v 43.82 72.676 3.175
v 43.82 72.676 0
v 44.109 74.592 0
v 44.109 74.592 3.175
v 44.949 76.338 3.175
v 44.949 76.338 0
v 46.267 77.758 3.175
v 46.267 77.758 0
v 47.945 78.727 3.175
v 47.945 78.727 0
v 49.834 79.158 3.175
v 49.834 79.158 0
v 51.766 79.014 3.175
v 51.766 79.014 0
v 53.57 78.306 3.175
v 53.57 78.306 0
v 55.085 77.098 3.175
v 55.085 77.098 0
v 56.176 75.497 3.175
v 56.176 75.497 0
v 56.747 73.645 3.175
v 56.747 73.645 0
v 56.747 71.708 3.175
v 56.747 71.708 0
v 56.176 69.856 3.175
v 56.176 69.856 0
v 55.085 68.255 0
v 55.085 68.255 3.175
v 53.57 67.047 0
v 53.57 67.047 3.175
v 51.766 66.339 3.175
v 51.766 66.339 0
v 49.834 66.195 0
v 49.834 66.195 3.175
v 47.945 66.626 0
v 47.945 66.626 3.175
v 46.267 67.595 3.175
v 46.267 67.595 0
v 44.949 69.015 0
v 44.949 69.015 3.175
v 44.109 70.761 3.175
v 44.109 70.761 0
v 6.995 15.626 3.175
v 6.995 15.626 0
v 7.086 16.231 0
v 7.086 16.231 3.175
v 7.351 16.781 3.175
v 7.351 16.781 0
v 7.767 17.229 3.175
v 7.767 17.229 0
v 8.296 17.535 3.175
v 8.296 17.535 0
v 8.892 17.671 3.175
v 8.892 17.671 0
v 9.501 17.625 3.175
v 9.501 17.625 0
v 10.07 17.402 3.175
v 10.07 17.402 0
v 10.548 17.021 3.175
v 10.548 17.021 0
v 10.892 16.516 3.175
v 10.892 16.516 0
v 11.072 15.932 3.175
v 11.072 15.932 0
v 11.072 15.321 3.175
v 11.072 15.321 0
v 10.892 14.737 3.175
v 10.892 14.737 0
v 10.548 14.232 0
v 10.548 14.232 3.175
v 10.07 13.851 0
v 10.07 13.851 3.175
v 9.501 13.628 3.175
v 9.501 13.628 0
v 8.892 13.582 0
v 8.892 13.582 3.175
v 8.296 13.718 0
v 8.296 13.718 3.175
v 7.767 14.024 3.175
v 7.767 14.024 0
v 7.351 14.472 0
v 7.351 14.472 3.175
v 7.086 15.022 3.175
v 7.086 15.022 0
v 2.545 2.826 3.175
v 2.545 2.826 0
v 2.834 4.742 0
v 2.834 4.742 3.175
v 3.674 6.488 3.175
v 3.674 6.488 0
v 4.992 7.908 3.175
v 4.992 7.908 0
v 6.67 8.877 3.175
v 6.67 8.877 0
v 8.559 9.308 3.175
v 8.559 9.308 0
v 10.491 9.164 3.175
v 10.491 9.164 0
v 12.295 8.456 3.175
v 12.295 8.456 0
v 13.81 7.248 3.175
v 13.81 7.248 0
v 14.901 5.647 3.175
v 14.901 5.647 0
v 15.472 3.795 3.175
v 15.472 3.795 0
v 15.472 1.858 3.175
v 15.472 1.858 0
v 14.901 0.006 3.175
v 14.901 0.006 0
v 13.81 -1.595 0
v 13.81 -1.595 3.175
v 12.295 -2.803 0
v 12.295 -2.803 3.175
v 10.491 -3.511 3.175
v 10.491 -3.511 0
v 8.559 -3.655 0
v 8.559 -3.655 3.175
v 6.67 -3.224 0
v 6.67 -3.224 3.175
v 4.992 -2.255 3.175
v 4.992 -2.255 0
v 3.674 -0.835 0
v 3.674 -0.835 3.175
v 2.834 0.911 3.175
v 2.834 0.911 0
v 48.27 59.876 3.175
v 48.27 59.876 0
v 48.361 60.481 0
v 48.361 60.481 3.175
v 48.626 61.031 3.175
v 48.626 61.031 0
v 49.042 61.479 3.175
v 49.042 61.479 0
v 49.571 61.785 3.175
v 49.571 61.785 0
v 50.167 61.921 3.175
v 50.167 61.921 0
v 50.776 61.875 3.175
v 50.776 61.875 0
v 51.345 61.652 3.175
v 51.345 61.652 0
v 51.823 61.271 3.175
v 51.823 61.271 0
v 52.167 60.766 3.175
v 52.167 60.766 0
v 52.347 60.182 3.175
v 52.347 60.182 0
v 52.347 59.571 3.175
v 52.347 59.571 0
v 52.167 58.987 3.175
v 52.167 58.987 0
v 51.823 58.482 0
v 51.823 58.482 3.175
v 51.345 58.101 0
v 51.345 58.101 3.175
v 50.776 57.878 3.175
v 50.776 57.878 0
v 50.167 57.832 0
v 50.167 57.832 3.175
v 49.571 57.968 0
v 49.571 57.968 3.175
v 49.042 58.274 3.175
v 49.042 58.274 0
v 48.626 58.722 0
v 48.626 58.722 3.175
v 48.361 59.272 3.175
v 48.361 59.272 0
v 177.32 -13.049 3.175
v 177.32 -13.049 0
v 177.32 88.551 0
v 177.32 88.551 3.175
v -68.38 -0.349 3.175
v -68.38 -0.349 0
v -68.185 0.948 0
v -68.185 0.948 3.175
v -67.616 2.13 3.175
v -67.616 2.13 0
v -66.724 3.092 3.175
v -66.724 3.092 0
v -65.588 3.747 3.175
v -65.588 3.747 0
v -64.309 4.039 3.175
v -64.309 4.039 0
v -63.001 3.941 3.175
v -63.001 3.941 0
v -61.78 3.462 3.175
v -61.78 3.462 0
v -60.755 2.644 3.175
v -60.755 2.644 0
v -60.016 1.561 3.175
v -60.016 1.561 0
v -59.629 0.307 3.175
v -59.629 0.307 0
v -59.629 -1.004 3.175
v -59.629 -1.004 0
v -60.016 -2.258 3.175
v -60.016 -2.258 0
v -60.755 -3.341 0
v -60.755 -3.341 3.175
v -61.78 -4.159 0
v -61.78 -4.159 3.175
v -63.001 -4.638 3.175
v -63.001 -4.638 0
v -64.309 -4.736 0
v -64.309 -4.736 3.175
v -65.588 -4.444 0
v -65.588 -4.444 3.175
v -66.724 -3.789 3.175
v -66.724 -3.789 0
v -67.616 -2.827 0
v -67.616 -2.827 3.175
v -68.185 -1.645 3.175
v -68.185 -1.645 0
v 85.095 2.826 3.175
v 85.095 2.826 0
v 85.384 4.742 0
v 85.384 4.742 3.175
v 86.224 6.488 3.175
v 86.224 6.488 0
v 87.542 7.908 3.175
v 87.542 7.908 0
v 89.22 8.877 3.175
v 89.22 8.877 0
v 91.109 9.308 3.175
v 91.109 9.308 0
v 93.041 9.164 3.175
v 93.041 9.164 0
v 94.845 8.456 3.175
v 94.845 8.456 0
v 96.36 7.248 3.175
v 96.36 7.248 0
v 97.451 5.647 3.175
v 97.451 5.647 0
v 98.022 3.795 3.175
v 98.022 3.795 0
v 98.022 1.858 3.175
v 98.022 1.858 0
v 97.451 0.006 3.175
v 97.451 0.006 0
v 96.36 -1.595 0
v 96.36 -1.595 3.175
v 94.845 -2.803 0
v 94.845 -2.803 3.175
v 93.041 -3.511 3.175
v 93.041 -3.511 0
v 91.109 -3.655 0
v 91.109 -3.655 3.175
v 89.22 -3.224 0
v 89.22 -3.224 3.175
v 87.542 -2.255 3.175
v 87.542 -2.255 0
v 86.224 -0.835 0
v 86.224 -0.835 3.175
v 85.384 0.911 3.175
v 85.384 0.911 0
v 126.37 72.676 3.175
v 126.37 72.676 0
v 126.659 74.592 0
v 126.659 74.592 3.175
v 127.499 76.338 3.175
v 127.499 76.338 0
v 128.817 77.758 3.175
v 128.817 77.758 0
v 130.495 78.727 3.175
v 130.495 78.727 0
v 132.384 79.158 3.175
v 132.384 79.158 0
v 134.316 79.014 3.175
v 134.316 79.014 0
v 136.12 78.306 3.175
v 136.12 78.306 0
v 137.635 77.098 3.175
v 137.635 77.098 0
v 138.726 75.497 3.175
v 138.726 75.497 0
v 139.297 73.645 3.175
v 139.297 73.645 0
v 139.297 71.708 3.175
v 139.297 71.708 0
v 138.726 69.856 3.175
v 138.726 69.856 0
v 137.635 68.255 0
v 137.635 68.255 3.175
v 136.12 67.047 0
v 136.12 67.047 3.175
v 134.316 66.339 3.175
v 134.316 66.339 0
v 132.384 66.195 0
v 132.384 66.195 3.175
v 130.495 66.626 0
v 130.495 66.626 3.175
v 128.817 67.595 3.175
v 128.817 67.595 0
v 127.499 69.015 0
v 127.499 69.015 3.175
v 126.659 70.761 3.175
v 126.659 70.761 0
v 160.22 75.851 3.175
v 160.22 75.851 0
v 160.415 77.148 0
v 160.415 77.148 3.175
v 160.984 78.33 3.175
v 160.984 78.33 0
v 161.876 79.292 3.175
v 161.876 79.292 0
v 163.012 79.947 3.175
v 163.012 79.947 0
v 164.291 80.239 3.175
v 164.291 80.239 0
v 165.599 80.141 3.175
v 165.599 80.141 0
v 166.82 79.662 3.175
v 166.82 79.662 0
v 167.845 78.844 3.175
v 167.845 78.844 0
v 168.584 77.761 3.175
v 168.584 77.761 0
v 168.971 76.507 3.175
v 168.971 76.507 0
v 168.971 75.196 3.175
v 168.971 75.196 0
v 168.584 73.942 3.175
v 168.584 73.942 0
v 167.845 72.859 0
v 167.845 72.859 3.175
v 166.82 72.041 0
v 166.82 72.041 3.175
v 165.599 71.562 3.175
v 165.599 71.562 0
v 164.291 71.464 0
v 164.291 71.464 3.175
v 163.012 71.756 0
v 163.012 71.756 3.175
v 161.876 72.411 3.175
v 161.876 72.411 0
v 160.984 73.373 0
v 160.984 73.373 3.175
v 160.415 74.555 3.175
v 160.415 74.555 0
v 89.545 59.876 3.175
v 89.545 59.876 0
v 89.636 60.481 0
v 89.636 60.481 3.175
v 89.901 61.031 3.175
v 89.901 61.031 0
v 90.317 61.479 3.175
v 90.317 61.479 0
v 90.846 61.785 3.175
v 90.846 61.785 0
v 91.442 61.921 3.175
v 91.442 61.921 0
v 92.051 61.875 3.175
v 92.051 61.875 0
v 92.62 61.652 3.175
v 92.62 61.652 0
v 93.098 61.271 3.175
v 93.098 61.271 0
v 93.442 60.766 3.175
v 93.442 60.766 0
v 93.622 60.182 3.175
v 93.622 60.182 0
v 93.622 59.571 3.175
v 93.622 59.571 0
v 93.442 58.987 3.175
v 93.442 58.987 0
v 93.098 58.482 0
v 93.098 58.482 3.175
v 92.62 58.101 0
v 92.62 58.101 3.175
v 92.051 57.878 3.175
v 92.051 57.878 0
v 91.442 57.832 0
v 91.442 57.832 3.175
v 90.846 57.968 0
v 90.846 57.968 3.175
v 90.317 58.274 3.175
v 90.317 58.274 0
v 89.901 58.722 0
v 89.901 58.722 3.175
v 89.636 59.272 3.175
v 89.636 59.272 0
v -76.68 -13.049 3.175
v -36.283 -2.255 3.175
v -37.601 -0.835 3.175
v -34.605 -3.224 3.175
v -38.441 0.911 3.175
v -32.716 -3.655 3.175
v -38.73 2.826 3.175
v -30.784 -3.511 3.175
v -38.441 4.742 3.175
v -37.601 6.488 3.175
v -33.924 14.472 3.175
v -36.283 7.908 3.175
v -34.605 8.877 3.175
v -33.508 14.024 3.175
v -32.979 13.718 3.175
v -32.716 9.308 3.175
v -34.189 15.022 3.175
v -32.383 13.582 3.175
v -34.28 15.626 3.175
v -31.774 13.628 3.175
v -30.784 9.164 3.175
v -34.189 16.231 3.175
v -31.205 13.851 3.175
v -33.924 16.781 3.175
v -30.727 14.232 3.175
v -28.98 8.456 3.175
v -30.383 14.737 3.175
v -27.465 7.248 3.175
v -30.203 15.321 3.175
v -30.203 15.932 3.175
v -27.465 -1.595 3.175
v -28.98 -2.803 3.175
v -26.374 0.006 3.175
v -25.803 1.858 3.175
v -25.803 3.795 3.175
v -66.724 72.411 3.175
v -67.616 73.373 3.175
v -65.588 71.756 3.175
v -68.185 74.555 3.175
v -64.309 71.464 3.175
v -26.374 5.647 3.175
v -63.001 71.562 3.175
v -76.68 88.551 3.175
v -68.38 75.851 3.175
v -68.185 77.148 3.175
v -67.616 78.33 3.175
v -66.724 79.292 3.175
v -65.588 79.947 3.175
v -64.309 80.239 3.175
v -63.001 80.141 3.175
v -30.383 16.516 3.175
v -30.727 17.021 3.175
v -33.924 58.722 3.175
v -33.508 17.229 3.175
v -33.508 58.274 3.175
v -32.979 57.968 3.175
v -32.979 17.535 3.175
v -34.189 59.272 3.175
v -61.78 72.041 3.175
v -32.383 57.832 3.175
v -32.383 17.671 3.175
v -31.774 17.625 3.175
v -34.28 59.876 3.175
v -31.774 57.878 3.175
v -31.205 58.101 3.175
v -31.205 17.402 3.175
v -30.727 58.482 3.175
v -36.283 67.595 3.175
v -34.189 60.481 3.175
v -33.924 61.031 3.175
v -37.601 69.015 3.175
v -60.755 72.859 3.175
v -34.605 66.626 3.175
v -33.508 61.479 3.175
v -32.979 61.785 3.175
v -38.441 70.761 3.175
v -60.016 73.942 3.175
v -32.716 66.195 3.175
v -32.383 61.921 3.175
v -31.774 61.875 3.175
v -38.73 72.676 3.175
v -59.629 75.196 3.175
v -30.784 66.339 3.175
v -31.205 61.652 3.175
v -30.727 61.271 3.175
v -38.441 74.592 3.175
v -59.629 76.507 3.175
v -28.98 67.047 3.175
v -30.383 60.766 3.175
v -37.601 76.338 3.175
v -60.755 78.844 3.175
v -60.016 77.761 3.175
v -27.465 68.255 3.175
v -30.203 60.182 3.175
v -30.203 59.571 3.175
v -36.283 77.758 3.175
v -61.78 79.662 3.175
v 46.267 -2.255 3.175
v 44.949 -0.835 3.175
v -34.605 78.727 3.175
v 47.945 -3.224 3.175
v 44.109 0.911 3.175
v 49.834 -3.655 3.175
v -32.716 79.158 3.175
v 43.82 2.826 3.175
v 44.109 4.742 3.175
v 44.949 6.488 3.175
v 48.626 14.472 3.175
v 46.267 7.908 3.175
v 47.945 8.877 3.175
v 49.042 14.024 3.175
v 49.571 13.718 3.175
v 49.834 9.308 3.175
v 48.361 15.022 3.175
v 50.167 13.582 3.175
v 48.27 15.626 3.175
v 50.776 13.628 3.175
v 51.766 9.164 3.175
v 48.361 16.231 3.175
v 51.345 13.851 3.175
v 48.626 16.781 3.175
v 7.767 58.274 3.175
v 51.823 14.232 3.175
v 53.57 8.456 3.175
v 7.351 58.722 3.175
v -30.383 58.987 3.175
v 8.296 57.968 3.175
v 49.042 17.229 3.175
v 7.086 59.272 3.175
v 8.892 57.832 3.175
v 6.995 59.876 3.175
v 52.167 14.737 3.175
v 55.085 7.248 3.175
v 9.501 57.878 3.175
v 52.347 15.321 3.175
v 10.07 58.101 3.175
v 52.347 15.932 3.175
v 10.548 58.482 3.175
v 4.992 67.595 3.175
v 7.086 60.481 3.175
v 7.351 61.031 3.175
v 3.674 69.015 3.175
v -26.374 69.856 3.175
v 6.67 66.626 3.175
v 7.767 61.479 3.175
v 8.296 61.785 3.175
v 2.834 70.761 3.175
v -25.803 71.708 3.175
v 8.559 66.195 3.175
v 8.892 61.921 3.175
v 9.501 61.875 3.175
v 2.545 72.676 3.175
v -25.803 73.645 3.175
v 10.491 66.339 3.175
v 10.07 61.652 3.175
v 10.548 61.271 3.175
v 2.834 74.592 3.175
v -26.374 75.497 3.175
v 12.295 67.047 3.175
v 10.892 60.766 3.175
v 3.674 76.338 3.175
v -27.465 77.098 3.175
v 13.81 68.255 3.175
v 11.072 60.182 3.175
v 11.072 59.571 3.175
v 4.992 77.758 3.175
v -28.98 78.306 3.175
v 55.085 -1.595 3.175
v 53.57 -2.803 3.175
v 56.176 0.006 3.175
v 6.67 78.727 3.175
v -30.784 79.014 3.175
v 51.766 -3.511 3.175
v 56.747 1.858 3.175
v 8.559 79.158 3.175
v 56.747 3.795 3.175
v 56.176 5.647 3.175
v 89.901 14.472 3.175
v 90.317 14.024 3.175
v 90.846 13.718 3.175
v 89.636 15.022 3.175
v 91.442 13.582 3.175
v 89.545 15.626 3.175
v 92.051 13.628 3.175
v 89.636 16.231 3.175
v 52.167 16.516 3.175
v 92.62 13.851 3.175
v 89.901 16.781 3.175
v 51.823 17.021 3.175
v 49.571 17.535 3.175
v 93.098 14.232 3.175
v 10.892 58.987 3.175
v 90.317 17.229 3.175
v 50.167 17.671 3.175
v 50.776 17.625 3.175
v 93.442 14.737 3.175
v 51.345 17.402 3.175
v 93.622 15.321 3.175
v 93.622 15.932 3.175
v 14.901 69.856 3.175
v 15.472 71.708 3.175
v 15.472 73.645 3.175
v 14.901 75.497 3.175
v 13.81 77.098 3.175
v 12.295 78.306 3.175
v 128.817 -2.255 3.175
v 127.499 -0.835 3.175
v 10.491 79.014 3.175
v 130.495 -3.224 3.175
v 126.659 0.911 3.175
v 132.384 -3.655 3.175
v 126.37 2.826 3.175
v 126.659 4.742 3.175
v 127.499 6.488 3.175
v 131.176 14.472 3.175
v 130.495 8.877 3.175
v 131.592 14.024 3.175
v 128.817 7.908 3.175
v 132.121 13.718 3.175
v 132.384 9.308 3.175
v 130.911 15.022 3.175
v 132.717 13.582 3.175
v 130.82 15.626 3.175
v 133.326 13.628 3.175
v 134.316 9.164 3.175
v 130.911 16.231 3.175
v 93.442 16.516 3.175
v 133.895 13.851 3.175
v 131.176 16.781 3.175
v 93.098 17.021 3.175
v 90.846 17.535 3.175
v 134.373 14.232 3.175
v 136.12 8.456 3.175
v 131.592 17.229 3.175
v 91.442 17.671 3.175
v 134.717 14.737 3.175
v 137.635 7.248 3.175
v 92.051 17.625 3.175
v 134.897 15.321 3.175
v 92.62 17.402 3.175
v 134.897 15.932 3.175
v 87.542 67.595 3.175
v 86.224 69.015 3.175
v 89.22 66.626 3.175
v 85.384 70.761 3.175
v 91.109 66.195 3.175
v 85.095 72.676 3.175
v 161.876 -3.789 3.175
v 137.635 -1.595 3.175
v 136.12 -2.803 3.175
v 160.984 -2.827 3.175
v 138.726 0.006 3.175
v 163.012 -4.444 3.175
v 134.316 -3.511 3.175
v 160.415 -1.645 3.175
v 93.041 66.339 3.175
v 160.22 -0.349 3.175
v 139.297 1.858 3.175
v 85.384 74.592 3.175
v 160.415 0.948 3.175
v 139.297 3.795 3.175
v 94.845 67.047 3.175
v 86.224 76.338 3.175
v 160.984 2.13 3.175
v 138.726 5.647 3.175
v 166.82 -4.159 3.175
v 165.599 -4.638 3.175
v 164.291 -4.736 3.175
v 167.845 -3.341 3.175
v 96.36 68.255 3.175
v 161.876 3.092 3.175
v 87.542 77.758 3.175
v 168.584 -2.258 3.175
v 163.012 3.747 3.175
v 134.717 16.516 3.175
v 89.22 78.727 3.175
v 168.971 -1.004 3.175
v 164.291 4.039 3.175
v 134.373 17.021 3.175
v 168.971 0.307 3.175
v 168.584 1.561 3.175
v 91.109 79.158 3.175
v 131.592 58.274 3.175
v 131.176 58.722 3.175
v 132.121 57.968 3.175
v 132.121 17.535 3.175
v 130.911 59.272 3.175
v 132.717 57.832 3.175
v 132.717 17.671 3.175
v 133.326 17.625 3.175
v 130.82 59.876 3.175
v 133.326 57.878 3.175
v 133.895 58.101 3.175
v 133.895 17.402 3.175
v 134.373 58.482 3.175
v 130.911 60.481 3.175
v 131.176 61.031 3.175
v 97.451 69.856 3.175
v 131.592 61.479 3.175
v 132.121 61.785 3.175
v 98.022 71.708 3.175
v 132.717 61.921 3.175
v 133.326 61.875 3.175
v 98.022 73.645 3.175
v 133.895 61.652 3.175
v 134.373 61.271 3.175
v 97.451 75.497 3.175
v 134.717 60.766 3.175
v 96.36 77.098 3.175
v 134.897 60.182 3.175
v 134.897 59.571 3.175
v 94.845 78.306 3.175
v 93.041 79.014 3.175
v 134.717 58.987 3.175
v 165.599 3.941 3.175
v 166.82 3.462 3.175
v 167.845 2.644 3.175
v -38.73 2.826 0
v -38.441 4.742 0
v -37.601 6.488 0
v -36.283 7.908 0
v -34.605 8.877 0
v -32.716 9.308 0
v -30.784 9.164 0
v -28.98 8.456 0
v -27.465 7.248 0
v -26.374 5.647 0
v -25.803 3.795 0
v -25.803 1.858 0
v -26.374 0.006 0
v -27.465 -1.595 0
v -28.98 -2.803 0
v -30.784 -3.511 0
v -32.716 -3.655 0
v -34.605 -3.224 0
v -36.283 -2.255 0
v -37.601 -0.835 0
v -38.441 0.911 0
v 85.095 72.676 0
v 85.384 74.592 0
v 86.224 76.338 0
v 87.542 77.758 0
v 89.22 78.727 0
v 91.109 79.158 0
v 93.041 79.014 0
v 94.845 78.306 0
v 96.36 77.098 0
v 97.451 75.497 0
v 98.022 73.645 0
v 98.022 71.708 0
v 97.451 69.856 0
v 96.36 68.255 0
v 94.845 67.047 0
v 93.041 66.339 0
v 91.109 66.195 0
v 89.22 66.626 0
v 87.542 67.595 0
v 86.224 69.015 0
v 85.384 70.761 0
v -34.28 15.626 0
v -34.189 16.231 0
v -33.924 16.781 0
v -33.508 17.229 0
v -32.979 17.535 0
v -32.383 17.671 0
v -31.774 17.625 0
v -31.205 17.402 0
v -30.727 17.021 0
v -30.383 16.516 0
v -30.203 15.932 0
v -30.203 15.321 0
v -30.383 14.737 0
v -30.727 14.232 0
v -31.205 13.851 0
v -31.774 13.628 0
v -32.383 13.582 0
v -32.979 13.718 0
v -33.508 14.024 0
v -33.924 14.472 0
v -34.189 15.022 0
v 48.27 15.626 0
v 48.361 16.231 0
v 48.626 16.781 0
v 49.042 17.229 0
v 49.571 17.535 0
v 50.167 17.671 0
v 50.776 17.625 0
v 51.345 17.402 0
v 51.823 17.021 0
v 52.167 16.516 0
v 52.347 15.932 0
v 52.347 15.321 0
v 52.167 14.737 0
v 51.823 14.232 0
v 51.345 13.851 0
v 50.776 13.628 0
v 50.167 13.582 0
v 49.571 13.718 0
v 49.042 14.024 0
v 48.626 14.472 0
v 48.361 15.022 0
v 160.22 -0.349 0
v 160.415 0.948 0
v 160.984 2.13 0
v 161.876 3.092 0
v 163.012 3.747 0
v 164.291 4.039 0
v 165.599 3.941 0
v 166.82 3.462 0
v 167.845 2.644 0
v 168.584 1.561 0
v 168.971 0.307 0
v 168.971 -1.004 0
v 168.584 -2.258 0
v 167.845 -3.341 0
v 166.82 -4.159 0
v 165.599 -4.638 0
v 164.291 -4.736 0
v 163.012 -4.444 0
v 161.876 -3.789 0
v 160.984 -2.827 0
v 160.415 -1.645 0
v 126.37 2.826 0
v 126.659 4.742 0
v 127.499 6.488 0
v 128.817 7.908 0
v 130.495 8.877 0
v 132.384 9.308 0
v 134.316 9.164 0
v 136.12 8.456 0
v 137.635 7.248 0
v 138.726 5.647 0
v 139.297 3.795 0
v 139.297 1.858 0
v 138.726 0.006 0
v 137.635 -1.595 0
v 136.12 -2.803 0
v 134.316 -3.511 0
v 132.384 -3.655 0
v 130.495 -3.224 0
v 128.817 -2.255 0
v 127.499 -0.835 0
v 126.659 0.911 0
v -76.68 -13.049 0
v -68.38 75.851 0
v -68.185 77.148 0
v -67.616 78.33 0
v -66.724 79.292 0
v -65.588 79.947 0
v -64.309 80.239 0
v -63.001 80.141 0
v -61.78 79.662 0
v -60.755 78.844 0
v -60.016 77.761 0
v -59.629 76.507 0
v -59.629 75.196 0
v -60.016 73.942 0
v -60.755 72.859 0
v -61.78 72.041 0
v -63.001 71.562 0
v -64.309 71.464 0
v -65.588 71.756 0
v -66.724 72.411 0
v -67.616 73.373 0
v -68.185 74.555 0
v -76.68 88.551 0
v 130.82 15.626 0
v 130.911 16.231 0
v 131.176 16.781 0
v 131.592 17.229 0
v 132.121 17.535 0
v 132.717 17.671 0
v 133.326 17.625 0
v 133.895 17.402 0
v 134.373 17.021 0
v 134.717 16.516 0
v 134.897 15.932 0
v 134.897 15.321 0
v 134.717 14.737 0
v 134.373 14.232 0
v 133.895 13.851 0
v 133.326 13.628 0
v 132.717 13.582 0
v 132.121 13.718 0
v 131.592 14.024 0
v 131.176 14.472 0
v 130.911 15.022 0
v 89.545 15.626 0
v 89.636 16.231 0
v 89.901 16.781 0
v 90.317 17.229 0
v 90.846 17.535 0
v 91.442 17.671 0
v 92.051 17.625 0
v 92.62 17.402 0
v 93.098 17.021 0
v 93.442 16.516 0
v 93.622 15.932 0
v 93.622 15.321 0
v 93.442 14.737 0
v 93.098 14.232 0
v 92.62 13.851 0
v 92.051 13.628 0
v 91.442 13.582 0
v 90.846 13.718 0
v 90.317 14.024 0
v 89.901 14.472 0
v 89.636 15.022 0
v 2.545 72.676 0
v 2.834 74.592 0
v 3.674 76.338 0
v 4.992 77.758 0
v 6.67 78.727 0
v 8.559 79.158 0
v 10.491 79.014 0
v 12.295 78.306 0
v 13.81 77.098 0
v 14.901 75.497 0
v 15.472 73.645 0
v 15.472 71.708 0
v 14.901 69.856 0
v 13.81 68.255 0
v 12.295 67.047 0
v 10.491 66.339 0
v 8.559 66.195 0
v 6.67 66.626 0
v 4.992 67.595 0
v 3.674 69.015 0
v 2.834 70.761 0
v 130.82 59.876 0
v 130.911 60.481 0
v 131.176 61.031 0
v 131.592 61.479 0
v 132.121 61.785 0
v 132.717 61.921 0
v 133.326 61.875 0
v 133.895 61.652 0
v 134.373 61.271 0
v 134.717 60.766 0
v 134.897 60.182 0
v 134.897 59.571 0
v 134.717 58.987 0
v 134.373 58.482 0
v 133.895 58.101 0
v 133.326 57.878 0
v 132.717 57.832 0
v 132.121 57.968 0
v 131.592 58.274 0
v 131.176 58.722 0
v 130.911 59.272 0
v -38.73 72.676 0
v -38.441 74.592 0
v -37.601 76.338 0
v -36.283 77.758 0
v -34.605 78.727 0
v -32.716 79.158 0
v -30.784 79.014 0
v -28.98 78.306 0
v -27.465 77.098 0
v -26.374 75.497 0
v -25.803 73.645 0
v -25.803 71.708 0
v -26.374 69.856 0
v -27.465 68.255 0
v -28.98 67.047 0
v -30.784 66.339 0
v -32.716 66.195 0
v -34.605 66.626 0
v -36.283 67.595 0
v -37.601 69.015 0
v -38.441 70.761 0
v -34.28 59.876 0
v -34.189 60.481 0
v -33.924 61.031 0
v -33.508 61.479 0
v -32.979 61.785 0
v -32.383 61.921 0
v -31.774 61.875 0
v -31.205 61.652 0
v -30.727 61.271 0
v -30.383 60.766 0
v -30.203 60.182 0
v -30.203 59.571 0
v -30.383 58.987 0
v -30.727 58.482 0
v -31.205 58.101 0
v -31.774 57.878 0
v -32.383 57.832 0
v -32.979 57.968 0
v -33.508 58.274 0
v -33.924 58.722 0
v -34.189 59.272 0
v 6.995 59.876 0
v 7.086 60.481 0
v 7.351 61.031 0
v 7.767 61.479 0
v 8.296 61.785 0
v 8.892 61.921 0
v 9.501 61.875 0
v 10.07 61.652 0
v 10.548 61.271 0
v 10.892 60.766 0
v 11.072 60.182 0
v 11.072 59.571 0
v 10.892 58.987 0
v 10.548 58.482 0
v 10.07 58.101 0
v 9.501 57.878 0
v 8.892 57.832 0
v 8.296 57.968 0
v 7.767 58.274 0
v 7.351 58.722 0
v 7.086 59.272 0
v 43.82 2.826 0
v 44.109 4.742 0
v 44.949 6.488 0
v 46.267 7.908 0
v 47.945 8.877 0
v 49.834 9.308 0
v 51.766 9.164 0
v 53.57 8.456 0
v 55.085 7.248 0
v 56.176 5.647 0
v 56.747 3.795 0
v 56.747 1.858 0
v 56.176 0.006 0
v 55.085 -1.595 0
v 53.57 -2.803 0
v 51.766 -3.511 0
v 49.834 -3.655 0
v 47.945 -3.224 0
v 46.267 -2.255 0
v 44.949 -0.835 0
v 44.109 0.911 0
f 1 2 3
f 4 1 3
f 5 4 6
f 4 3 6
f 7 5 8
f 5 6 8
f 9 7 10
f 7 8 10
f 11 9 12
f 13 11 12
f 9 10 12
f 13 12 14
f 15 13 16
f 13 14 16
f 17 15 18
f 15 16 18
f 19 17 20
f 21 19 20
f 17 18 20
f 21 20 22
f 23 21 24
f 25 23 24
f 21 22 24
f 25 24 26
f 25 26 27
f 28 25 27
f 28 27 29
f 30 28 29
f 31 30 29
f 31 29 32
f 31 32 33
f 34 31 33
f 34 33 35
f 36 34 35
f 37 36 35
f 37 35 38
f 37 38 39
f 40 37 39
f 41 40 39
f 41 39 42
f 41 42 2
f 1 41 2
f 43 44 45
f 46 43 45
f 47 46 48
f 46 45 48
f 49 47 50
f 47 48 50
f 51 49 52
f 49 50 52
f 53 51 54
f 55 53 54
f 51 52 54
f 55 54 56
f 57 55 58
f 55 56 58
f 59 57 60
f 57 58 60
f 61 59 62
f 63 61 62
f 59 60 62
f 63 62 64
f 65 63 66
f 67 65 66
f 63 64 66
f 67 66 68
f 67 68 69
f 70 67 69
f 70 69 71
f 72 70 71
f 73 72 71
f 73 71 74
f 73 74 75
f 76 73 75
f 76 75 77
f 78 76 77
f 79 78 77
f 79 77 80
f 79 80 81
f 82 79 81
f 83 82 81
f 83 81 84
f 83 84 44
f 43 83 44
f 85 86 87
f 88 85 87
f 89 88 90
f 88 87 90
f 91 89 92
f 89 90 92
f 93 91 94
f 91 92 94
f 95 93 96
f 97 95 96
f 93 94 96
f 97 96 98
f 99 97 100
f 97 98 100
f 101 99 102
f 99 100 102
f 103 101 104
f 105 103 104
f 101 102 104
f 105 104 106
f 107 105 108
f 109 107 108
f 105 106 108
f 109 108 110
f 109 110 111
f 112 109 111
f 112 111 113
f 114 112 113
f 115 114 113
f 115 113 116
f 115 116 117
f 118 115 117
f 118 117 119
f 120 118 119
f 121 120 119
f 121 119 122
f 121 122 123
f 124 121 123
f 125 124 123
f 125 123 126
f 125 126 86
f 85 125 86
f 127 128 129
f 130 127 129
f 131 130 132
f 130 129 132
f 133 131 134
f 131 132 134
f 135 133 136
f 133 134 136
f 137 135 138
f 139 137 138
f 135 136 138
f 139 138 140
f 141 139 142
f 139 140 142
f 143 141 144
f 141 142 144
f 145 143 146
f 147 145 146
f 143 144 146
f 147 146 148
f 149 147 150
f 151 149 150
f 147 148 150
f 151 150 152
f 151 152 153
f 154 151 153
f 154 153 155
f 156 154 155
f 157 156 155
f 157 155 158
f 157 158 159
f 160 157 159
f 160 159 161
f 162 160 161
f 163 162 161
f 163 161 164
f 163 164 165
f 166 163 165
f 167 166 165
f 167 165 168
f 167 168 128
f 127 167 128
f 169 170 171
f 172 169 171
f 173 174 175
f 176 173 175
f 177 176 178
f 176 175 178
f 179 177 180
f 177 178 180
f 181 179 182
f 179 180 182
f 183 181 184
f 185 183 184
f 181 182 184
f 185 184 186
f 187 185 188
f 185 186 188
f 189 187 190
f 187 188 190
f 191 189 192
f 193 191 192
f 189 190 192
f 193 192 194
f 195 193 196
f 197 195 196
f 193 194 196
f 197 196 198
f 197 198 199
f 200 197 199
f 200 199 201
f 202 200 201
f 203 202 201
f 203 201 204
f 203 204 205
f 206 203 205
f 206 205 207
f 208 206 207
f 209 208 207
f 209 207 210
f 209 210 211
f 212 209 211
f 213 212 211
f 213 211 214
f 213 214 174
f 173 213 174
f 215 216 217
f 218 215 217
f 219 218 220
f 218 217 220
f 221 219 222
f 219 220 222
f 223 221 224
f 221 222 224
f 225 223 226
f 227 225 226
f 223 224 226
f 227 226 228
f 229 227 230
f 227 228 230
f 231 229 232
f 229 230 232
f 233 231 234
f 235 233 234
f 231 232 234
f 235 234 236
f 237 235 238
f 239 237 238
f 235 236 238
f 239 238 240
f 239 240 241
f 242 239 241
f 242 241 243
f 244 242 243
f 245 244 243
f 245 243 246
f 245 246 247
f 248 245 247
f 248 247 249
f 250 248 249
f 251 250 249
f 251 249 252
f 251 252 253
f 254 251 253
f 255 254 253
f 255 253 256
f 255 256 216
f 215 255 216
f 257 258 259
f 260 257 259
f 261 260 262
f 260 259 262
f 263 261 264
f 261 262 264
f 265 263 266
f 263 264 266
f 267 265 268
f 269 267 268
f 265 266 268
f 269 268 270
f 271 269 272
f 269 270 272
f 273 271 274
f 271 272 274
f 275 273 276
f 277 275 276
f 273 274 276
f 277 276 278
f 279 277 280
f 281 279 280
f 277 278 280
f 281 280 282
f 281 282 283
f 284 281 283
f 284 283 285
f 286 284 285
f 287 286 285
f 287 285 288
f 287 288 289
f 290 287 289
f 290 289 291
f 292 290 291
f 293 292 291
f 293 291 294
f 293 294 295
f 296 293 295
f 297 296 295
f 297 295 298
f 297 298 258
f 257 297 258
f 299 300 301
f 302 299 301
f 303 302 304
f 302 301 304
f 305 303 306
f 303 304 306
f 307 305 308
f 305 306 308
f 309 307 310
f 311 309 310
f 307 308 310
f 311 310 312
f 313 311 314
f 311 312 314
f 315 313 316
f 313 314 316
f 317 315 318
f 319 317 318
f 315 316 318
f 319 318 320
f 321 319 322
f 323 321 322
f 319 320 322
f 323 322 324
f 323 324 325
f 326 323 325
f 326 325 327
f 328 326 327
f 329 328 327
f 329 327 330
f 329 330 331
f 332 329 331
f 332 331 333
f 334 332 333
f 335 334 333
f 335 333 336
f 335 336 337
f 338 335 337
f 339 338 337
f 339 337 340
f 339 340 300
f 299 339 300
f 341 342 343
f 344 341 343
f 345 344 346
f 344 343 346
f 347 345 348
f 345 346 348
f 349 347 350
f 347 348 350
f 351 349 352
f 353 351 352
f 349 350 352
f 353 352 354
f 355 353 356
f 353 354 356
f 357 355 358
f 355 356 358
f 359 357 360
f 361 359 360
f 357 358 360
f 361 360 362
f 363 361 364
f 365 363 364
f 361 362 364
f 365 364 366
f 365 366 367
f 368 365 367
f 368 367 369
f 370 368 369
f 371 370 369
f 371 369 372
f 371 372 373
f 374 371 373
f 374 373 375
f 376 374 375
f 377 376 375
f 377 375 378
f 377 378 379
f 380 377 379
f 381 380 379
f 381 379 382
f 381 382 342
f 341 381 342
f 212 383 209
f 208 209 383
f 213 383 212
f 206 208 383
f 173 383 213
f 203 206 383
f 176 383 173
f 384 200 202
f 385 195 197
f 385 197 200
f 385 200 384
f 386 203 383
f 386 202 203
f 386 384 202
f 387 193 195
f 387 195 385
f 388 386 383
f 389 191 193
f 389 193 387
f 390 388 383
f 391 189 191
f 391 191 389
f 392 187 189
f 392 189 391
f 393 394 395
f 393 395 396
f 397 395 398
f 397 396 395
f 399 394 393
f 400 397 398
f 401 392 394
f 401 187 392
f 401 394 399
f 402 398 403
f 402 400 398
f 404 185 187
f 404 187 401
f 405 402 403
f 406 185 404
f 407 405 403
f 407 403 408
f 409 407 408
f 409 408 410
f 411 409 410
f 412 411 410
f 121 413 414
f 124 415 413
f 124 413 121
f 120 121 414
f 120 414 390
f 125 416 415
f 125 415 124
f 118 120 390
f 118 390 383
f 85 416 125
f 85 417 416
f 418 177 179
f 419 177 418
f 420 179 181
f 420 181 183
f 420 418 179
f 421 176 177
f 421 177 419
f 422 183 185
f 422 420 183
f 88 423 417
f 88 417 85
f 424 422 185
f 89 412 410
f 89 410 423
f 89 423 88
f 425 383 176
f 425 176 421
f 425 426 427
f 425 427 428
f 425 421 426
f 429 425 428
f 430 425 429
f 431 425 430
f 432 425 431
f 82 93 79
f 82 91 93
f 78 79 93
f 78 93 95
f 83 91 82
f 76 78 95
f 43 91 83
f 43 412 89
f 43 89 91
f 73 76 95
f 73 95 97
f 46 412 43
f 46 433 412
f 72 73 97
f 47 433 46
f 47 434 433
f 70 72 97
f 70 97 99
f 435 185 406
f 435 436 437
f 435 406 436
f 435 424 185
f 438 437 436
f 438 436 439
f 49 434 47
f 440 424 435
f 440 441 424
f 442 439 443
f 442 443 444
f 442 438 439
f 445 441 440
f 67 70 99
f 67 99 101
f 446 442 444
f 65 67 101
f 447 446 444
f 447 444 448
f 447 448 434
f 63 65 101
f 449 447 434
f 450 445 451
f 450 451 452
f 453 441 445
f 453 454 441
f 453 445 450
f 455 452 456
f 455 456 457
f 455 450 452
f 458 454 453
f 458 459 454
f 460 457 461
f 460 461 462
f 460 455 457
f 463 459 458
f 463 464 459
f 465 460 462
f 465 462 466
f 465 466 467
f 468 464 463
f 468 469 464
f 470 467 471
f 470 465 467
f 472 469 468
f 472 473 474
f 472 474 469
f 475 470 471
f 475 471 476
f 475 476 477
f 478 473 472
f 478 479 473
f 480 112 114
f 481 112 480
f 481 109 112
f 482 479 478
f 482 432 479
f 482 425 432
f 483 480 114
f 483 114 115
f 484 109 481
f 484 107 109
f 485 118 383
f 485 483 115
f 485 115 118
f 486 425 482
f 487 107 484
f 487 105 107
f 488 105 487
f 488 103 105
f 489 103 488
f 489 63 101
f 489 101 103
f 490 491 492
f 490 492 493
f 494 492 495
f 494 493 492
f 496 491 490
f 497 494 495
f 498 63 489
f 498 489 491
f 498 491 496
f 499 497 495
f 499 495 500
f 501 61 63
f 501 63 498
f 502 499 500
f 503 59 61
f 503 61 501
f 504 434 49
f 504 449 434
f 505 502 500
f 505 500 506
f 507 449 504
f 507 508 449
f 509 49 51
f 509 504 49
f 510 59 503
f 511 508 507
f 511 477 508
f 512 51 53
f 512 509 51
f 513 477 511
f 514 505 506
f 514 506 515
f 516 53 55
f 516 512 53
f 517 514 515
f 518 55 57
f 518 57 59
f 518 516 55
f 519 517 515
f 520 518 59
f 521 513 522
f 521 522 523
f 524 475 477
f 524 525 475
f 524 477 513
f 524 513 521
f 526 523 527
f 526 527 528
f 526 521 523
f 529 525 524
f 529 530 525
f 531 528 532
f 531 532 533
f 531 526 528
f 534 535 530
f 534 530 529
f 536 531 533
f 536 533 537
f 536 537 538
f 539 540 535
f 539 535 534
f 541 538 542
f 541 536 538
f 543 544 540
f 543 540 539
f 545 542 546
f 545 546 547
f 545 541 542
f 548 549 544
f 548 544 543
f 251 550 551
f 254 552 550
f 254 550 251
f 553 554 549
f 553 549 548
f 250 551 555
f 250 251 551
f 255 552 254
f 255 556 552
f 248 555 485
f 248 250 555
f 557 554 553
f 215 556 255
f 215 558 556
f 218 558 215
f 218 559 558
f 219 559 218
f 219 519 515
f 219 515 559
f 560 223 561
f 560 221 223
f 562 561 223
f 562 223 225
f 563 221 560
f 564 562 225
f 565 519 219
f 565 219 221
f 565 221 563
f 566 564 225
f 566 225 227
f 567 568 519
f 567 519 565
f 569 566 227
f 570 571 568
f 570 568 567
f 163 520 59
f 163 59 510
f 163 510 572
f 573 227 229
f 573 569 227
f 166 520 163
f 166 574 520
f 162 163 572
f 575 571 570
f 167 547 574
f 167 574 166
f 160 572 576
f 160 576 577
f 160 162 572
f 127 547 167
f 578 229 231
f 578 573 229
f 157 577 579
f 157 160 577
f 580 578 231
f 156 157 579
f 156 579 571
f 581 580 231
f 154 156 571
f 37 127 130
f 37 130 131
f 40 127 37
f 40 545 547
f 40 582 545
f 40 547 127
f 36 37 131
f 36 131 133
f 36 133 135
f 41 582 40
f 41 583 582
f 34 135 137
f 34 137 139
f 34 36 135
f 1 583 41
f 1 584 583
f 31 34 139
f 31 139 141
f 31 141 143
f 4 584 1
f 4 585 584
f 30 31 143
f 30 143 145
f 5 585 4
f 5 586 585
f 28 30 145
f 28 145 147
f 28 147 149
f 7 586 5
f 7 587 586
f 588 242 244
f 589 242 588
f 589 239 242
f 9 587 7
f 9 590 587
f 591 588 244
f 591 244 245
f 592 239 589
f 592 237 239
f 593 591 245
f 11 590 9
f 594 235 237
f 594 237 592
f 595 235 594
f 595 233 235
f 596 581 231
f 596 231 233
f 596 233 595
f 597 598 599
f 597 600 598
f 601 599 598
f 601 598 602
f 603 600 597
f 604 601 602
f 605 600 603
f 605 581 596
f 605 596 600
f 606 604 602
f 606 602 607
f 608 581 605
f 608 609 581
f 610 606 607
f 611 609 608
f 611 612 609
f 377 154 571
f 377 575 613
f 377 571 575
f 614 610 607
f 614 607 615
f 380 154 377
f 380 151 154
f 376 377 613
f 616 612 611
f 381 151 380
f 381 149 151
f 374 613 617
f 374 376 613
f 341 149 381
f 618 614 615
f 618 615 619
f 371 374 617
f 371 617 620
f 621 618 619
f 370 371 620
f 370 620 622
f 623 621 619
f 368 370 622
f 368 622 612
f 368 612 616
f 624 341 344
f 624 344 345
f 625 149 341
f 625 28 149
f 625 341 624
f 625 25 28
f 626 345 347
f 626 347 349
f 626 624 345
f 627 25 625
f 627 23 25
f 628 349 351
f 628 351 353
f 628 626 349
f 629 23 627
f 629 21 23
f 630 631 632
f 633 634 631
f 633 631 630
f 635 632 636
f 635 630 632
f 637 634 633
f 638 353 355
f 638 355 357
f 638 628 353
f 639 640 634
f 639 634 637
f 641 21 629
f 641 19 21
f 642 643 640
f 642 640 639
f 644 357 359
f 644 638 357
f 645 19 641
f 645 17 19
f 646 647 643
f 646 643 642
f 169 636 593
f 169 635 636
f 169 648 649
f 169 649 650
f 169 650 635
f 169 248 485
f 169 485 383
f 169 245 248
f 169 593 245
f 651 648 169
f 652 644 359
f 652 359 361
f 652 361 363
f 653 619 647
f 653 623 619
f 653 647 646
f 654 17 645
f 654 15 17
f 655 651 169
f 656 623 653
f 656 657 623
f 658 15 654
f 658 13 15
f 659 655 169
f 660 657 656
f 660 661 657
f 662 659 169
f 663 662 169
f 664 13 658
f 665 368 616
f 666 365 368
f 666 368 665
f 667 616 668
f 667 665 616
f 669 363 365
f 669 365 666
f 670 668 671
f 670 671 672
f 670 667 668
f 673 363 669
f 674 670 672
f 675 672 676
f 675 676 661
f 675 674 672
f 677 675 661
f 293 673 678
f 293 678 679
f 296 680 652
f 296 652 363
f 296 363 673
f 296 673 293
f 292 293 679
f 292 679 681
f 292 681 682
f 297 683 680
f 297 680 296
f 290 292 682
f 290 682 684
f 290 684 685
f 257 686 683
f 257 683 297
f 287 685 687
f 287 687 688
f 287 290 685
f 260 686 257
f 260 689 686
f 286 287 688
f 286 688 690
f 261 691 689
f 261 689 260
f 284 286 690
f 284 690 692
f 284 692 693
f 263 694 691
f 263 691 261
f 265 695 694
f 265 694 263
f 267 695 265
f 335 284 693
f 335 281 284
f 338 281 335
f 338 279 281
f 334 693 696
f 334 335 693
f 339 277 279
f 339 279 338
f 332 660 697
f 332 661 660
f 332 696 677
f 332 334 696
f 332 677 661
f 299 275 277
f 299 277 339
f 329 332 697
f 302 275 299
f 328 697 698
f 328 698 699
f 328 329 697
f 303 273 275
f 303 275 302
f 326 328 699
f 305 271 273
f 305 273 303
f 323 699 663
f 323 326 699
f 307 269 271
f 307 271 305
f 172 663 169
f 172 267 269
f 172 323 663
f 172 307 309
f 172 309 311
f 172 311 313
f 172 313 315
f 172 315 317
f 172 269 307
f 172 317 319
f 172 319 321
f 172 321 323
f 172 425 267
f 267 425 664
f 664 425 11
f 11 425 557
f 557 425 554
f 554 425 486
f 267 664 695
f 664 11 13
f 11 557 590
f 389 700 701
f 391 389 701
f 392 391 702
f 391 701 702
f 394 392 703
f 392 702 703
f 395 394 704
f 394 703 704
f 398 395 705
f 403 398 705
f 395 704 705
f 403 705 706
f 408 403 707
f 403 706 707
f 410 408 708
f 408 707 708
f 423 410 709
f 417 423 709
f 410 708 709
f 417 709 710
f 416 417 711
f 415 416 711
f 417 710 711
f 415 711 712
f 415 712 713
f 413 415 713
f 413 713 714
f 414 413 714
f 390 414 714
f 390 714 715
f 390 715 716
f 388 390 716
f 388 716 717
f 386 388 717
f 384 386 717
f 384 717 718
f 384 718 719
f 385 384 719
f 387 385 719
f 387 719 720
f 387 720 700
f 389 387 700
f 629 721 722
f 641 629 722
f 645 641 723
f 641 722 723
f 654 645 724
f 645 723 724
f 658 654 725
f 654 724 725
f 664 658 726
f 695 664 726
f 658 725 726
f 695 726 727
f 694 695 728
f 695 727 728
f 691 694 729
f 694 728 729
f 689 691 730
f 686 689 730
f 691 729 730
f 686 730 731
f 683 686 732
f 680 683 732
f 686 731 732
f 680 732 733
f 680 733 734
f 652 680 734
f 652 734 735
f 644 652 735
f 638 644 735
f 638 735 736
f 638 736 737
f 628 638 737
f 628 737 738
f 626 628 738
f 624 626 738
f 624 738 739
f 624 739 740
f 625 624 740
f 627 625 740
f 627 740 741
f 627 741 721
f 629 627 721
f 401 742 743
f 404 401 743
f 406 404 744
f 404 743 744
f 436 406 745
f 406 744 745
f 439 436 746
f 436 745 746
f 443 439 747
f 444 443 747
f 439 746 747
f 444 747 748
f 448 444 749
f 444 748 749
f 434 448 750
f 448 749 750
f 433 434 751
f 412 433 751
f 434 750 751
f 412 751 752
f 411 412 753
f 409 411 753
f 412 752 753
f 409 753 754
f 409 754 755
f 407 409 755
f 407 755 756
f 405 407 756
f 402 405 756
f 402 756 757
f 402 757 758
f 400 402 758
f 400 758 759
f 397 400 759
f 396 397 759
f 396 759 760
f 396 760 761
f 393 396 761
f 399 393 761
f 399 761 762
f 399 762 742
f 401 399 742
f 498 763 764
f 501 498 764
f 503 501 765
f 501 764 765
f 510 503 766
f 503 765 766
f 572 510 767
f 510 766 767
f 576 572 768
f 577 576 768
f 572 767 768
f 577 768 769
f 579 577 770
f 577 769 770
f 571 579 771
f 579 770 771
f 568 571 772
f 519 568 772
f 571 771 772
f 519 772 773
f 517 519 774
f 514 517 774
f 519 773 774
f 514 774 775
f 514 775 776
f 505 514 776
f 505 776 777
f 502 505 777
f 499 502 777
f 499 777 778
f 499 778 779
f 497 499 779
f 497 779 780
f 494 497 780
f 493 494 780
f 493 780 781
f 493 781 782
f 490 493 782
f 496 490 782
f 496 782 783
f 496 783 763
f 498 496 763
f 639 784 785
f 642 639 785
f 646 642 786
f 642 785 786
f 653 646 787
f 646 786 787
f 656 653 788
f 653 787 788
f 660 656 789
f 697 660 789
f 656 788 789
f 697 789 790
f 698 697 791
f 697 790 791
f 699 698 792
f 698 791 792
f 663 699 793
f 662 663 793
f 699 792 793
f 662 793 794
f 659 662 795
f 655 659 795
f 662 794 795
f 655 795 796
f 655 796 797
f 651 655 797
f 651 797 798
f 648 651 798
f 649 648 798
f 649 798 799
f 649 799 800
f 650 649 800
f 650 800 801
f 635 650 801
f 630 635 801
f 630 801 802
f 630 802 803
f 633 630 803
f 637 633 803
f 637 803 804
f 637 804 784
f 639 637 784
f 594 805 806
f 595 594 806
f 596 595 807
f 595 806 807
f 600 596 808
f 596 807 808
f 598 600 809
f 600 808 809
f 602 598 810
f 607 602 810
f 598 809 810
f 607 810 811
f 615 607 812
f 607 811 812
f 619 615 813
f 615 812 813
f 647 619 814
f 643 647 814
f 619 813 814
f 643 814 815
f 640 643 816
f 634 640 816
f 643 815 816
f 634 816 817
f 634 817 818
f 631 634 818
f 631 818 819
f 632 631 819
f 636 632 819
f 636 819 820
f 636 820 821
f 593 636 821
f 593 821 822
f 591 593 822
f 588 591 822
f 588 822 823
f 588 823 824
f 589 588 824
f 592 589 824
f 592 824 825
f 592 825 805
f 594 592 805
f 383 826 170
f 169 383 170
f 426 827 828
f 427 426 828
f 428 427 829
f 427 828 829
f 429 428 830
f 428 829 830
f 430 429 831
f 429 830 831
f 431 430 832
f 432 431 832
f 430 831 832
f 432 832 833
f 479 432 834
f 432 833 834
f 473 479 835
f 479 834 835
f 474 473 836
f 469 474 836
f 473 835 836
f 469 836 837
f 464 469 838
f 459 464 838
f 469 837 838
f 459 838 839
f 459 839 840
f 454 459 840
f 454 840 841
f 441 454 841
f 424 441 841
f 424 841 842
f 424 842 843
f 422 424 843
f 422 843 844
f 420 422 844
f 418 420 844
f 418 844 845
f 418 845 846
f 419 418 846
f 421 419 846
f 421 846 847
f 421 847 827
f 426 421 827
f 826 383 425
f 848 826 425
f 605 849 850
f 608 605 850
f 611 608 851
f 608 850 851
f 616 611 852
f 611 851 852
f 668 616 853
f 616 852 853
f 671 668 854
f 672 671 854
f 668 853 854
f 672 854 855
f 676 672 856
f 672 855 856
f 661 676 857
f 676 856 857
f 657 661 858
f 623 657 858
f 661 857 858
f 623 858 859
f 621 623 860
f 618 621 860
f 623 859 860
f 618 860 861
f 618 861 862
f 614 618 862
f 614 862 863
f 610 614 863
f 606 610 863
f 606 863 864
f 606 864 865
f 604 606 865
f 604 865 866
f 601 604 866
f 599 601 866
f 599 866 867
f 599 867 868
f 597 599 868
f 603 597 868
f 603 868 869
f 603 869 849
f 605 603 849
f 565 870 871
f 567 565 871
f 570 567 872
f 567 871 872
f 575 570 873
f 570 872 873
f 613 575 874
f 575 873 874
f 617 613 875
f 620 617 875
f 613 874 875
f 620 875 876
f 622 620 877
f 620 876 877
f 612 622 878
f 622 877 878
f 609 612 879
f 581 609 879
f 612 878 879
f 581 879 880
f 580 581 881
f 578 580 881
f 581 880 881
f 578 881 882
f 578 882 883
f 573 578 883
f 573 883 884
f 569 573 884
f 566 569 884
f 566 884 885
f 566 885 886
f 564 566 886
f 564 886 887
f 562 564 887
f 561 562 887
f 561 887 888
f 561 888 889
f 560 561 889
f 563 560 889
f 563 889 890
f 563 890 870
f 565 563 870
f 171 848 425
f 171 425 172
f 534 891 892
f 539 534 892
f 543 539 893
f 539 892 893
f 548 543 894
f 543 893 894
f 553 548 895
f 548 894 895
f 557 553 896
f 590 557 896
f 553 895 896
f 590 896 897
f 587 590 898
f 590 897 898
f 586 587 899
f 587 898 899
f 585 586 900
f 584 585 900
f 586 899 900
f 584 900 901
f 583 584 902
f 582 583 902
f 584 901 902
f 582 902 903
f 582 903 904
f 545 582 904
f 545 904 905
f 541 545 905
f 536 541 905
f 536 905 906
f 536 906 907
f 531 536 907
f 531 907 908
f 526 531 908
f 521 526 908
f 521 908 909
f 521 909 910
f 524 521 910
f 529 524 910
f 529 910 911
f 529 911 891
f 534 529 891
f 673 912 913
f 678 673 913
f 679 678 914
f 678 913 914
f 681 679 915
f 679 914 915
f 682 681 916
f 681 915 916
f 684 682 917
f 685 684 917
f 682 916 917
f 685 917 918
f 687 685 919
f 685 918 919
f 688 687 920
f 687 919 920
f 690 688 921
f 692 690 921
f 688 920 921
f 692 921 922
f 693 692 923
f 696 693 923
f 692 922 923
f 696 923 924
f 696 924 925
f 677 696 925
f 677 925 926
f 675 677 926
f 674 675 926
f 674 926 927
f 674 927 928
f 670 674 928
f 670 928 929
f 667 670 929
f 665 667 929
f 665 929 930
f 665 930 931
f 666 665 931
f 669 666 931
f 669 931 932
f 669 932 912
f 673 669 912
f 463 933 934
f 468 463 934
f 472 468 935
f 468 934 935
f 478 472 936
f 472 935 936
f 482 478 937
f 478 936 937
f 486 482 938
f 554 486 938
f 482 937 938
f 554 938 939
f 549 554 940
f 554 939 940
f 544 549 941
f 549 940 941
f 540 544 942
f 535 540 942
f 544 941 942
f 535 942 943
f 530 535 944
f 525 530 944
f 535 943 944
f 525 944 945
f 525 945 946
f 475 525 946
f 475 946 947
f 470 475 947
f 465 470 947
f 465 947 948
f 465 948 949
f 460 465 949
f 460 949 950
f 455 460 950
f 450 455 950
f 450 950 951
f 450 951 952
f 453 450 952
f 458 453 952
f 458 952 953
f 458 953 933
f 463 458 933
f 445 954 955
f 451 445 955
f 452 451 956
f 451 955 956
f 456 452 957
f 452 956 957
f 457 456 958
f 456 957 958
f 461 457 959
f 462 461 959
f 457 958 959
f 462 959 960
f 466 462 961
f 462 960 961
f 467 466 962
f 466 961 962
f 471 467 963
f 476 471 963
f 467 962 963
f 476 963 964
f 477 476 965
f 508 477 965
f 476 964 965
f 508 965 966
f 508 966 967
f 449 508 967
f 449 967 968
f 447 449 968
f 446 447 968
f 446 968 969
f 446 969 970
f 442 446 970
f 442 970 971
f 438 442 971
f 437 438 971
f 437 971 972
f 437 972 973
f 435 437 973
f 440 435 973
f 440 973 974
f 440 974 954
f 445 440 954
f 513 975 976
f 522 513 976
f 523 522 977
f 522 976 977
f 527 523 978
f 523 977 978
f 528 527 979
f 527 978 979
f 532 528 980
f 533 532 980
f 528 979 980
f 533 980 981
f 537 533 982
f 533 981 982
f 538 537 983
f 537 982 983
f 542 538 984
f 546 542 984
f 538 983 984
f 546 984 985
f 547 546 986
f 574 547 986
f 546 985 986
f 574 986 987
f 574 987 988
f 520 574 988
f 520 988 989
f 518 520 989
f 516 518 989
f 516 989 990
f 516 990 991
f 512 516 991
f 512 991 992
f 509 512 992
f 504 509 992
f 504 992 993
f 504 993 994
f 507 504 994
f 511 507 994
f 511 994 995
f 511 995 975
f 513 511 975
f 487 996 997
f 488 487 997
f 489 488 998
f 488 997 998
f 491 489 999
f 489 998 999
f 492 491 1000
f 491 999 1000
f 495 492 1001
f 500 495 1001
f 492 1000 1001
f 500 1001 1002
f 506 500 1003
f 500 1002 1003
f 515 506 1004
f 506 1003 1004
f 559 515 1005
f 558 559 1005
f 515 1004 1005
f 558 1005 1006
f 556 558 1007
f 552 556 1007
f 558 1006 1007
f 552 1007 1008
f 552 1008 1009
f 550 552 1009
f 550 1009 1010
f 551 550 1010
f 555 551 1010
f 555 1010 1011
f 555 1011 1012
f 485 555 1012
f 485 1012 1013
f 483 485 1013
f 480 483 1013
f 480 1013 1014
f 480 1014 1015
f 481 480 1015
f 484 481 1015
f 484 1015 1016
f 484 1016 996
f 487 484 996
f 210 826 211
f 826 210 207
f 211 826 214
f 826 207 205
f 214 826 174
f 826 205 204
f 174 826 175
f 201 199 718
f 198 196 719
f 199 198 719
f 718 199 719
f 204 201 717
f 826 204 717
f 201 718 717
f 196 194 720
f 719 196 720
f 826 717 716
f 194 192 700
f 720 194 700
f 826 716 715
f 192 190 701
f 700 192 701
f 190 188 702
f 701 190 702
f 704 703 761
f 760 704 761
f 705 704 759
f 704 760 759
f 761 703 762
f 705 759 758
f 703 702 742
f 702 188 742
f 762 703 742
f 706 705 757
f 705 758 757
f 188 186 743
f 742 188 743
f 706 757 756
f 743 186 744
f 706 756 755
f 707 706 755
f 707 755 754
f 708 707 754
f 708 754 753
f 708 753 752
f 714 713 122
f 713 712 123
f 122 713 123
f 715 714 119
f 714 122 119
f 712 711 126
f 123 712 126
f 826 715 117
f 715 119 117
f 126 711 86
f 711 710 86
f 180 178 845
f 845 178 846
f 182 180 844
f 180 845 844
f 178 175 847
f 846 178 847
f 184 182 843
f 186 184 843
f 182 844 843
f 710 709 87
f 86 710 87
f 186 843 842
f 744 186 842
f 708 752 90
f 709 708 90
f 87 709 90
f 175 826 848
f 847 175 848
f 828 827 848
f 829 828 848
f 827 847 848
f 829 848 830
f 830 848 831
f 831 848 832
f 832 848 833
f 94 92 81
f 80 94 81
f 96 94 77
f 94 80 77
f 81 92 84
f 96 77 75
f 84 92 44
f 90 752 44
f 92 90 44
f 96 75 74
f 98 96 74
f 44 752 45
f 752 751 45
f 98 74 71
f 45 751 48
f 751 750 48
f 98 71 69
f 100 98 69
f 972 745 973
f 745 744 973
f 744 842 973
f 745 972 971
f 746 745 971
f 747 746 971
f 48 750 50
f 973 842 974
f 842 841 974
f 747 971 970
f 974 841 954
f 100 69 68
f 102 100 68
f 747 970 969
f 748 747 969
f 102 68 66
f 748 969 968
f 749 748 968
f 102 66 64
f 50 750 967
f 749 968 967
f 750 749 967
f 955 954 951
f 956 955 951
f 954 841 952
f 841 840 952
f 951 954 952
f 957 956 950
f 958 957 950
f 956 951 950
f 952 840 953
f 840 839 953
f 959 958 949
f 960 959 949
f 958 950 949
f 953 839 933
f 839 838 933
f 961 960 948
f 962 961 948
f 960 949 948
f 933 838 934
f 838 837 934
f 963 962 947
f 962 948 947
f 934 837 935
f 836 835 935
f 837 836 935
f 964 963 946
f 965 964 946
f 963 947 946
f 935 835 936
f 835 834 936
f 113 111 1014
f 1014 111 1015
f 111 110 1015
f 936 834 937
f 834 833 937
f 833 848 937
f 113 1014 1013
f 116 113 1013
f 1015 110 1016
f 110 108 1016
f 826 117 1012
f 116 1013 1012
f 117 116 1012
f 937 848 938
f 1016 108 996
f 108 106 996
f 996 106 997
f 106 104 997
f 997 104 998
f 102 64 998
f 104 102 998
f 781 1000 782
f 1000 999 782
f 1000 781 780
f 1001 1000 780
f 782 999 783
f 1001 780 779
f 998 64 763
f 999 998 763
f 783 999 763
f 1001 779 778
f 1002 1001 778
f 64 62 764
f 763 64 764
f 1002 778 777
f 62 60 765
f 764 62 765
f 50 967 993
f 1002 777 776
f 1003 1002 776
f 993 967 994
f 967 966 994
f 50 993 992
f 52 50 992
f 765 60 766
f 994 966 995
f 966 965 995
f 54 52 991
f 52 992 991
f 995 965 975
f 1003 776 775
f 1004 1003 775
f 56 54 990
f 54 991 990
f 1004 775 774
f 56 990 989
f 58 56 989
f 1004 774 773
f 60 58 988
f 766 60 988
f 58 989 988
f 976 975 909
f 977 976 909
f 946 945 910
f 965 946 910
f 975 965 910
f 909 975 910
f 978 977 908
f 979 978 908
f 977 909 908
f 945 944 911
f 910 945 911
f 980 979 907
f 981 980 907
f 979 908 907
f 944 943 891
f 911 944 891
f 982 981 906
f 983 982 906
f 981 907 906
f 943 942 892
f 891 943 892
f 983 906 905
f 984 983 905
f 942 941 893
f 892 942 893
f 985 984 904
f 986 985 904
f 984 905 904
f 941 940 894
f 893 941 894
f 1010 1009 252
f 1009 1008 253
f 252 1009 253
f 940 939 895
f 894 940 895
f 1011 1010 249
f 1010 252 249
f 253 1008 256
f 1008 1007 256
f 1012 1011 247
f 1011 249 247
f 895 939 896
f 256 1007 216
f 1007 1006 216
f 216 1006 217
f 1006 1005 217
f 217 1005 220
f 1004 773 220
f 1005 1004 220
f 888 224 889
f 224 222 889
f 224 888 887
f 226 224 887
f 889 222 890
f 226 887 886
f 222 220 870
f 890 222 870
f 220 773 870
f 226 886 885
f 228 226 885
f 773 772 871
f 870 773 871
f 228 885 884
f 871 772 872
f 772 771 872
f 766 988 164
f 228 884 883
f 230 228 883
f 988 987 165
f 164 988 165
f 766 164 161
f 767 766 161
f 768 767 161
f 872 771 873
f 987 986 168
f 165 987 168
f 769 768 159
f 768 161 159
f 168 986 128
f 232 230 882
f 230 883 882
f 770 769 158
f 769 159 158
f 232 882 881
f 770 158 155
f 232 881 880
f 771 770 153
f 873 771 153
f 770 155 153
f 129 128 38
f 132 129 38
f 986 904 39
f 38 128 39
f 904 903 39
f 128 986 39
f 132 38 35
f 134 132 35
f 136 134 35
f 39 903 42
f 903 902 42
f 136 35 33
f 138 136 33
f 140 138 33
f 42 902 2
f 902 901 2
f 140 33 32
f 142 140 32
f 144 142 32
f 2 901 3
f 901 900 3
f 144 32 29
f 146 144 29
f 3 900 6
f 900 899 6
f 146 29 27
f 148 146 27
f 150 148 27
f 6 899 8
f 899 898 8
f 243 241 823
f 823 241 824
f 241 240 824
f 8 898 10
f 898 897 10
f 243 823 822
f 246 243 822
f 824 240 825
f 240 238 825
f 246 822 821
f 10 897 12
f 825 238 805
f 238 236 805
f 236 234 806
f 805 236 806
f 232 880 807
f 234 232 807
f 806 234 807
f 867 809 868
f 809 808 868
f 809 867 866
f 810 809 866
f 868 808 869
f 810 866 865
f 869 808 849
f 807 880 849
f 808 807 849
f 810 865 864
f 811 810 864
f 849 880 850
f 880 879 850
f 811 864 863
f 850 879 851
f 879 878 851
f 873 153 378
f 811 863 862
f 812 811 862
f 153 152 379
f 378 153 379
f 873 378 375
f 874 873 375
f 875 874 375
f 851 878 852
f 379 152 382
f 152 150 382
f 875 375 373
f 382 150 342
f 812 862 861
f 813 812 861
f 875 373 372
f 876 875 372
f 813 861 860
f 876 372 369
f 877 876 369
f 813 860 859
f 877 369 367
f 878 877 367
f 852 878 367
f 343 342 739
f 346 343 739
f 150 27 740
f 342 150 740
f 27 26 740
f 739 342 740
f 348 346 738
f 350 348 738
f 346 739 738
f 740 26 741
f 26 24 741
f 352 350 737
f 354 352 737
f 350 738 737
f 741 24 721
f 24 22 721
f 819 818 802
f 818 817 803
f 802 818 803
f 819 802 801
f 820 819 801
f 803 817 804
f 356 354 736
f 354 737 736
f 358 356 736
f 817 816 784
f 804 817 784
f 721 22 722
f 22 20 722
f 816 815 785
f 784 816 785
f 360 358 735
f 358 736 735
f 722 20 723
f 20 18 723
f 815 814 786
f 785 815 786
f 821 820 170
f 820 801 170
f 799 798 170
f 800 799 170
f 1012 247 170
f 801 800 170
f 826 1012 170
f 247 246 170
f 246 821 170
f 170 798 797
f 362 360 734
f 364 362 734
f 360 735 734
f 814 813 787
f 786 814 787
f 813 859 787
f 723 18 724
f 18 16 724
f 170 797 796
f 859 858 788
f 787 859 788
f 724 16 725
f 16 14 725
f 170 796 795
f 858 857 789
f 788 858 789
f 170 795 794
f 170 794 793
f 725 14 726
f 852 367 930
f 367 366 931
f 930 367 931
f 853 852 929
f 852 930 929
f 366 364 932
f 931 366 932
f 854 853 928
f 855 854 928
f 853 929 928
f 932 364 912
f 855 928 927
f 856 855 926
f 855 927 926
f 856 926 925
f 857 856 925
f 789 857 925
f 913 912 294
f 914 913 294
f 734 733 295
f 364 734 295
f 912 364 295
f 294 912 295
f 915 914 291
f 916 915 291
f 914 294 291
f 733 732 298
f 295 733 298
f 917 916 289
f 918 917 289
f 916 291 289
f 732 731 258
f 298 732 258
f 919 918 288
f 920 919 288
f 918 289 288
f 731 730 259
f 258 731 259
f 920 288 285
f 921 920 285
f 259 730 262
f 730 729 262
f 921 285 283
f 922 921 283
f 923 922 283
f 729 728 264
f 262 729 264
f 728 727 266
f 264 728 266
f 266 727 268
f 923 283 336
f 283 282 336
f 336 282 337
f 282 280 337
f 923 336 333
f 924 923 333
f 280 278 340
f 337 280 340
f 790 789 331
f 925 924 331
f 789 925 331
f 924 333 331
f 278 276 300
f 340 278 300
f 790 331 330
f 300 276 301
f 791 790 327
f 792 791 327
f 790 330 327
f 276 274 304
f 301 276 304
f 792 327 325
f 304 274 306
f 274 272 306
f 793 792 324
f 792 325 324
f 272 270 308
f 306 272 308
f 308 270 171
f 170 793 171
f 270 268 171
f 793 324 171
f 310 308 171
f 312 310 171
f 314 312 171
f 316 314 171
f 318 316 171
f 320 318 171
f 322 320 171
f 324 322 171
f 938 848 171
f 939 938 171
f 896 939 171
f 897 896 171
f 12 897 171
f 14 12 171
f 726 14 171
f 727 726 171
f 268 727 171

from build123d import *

# Parameters (mm, degrees)
F0_W      = 279.4
F0_H      = 101.6
F1_DEPTH  = 3.175
F2_W      = 25.4
F2_H      = 76.2
F3_DEPTH  = 3.176
F5_D      = 6.35
F7_D      = 8.8
F9_D      = 8.8
F11_D     = 4.1
F12_W     = 25.4
F12_H     = 25.4
F12_R     = 3.175
F13_DEPTH = 25.4
F14_D     = 12.9999994


with BuildPart() as f1:
    # F0 (on Top) → F1 (new body)
    with BuildSketch(Plane.XY):
        with Locations((37.6198536942, 37.7514991719)):
            Rectangle(F0_W, F0_H)
    extrude(amount=F1_DEPTH)

    # F2 (on face) → F3 (cut, through all)
    with BuildSketch(Plane.XY.offset(3.175)):
        with Locations((-89.3801463058, 25.0514991719)):
            Rectangle(F2_W, F2_H)
    extrude(amount=-F3_DEPTH, mode=Mode.SUBTRACT)

    # F5 (through all)
    with Locations(Plane.XY.offset(3.175)):
        with Locations((-89.3801463058, 75.8514991719)):
            Hole(F5_D / 2)

    # F7 (through all)
    with Locations(Plane.XY.offset(3.175)):
        with Locations((-63.9801463058, 75.8514991719)):
            Hole(F7_D / 2)

    # F9 (through all)
    with Locations(Plane.XY.offset(3.175)):
        with Locations((-63.9801463058, -0.3485008281), (164.6198536942, -0.3485008281), (164.6198536942, 75.8514991719)):
            Hole(F9_D / 2)

    # F11 (through all)
    with Locations(Plane.XY.offset(3.175)):
        with Locations((132.8698536942, 15.6264989719), (91.5948536942, 15.6264989719), (50.3198536942, 15.6264989719), (9.0448536942, 15.6264989719), (-32.2301463058, 15.6264989719), (132.8698536942, 59.8764993719), (91.5948536942, 59.8764993719), (50.3198536942, 59.8764993719), (9.0448536942, 59.8764993719), (-32.2301463058, 59.8764993719)):
            Hole(F11_D / 2)

    # F12 (on face) → F13 (cut)
    with BuildSketch(Plane.XY.offset(3.175)):
        with Locations((-89.3801463058, 75.8514991719)):
            Rectangle(F12_W, F12_H)
        with Locations((-89.3801463058, 75.8514991719)):
            Circle(F12_R, mode=Mode.SUBTRACT)
    extrude(amount=-F13_DEPTH, mode=Mode.SUBTRACT)

    # F14 (through all)
    with Locations(Plane.XY.offset(3.175)):
        with Locations((132.8698536942, 2.8264991719), (91.5948536942, 2.8264991719), (50.3198536942, 2.8264991719), (9.0448536942, 2.8264991719), (-32.2301463058, 2.8264991719), (132.8698536942, 72.6764991719), (91.5948536942, 72.6764991719), (50.3198536942, 72.6764991719), (9.0448536942, 72.6764991719), (-32.2301463058, 72.6764991719)):
            Hole(F14_D / 2)


solid = f1.part
